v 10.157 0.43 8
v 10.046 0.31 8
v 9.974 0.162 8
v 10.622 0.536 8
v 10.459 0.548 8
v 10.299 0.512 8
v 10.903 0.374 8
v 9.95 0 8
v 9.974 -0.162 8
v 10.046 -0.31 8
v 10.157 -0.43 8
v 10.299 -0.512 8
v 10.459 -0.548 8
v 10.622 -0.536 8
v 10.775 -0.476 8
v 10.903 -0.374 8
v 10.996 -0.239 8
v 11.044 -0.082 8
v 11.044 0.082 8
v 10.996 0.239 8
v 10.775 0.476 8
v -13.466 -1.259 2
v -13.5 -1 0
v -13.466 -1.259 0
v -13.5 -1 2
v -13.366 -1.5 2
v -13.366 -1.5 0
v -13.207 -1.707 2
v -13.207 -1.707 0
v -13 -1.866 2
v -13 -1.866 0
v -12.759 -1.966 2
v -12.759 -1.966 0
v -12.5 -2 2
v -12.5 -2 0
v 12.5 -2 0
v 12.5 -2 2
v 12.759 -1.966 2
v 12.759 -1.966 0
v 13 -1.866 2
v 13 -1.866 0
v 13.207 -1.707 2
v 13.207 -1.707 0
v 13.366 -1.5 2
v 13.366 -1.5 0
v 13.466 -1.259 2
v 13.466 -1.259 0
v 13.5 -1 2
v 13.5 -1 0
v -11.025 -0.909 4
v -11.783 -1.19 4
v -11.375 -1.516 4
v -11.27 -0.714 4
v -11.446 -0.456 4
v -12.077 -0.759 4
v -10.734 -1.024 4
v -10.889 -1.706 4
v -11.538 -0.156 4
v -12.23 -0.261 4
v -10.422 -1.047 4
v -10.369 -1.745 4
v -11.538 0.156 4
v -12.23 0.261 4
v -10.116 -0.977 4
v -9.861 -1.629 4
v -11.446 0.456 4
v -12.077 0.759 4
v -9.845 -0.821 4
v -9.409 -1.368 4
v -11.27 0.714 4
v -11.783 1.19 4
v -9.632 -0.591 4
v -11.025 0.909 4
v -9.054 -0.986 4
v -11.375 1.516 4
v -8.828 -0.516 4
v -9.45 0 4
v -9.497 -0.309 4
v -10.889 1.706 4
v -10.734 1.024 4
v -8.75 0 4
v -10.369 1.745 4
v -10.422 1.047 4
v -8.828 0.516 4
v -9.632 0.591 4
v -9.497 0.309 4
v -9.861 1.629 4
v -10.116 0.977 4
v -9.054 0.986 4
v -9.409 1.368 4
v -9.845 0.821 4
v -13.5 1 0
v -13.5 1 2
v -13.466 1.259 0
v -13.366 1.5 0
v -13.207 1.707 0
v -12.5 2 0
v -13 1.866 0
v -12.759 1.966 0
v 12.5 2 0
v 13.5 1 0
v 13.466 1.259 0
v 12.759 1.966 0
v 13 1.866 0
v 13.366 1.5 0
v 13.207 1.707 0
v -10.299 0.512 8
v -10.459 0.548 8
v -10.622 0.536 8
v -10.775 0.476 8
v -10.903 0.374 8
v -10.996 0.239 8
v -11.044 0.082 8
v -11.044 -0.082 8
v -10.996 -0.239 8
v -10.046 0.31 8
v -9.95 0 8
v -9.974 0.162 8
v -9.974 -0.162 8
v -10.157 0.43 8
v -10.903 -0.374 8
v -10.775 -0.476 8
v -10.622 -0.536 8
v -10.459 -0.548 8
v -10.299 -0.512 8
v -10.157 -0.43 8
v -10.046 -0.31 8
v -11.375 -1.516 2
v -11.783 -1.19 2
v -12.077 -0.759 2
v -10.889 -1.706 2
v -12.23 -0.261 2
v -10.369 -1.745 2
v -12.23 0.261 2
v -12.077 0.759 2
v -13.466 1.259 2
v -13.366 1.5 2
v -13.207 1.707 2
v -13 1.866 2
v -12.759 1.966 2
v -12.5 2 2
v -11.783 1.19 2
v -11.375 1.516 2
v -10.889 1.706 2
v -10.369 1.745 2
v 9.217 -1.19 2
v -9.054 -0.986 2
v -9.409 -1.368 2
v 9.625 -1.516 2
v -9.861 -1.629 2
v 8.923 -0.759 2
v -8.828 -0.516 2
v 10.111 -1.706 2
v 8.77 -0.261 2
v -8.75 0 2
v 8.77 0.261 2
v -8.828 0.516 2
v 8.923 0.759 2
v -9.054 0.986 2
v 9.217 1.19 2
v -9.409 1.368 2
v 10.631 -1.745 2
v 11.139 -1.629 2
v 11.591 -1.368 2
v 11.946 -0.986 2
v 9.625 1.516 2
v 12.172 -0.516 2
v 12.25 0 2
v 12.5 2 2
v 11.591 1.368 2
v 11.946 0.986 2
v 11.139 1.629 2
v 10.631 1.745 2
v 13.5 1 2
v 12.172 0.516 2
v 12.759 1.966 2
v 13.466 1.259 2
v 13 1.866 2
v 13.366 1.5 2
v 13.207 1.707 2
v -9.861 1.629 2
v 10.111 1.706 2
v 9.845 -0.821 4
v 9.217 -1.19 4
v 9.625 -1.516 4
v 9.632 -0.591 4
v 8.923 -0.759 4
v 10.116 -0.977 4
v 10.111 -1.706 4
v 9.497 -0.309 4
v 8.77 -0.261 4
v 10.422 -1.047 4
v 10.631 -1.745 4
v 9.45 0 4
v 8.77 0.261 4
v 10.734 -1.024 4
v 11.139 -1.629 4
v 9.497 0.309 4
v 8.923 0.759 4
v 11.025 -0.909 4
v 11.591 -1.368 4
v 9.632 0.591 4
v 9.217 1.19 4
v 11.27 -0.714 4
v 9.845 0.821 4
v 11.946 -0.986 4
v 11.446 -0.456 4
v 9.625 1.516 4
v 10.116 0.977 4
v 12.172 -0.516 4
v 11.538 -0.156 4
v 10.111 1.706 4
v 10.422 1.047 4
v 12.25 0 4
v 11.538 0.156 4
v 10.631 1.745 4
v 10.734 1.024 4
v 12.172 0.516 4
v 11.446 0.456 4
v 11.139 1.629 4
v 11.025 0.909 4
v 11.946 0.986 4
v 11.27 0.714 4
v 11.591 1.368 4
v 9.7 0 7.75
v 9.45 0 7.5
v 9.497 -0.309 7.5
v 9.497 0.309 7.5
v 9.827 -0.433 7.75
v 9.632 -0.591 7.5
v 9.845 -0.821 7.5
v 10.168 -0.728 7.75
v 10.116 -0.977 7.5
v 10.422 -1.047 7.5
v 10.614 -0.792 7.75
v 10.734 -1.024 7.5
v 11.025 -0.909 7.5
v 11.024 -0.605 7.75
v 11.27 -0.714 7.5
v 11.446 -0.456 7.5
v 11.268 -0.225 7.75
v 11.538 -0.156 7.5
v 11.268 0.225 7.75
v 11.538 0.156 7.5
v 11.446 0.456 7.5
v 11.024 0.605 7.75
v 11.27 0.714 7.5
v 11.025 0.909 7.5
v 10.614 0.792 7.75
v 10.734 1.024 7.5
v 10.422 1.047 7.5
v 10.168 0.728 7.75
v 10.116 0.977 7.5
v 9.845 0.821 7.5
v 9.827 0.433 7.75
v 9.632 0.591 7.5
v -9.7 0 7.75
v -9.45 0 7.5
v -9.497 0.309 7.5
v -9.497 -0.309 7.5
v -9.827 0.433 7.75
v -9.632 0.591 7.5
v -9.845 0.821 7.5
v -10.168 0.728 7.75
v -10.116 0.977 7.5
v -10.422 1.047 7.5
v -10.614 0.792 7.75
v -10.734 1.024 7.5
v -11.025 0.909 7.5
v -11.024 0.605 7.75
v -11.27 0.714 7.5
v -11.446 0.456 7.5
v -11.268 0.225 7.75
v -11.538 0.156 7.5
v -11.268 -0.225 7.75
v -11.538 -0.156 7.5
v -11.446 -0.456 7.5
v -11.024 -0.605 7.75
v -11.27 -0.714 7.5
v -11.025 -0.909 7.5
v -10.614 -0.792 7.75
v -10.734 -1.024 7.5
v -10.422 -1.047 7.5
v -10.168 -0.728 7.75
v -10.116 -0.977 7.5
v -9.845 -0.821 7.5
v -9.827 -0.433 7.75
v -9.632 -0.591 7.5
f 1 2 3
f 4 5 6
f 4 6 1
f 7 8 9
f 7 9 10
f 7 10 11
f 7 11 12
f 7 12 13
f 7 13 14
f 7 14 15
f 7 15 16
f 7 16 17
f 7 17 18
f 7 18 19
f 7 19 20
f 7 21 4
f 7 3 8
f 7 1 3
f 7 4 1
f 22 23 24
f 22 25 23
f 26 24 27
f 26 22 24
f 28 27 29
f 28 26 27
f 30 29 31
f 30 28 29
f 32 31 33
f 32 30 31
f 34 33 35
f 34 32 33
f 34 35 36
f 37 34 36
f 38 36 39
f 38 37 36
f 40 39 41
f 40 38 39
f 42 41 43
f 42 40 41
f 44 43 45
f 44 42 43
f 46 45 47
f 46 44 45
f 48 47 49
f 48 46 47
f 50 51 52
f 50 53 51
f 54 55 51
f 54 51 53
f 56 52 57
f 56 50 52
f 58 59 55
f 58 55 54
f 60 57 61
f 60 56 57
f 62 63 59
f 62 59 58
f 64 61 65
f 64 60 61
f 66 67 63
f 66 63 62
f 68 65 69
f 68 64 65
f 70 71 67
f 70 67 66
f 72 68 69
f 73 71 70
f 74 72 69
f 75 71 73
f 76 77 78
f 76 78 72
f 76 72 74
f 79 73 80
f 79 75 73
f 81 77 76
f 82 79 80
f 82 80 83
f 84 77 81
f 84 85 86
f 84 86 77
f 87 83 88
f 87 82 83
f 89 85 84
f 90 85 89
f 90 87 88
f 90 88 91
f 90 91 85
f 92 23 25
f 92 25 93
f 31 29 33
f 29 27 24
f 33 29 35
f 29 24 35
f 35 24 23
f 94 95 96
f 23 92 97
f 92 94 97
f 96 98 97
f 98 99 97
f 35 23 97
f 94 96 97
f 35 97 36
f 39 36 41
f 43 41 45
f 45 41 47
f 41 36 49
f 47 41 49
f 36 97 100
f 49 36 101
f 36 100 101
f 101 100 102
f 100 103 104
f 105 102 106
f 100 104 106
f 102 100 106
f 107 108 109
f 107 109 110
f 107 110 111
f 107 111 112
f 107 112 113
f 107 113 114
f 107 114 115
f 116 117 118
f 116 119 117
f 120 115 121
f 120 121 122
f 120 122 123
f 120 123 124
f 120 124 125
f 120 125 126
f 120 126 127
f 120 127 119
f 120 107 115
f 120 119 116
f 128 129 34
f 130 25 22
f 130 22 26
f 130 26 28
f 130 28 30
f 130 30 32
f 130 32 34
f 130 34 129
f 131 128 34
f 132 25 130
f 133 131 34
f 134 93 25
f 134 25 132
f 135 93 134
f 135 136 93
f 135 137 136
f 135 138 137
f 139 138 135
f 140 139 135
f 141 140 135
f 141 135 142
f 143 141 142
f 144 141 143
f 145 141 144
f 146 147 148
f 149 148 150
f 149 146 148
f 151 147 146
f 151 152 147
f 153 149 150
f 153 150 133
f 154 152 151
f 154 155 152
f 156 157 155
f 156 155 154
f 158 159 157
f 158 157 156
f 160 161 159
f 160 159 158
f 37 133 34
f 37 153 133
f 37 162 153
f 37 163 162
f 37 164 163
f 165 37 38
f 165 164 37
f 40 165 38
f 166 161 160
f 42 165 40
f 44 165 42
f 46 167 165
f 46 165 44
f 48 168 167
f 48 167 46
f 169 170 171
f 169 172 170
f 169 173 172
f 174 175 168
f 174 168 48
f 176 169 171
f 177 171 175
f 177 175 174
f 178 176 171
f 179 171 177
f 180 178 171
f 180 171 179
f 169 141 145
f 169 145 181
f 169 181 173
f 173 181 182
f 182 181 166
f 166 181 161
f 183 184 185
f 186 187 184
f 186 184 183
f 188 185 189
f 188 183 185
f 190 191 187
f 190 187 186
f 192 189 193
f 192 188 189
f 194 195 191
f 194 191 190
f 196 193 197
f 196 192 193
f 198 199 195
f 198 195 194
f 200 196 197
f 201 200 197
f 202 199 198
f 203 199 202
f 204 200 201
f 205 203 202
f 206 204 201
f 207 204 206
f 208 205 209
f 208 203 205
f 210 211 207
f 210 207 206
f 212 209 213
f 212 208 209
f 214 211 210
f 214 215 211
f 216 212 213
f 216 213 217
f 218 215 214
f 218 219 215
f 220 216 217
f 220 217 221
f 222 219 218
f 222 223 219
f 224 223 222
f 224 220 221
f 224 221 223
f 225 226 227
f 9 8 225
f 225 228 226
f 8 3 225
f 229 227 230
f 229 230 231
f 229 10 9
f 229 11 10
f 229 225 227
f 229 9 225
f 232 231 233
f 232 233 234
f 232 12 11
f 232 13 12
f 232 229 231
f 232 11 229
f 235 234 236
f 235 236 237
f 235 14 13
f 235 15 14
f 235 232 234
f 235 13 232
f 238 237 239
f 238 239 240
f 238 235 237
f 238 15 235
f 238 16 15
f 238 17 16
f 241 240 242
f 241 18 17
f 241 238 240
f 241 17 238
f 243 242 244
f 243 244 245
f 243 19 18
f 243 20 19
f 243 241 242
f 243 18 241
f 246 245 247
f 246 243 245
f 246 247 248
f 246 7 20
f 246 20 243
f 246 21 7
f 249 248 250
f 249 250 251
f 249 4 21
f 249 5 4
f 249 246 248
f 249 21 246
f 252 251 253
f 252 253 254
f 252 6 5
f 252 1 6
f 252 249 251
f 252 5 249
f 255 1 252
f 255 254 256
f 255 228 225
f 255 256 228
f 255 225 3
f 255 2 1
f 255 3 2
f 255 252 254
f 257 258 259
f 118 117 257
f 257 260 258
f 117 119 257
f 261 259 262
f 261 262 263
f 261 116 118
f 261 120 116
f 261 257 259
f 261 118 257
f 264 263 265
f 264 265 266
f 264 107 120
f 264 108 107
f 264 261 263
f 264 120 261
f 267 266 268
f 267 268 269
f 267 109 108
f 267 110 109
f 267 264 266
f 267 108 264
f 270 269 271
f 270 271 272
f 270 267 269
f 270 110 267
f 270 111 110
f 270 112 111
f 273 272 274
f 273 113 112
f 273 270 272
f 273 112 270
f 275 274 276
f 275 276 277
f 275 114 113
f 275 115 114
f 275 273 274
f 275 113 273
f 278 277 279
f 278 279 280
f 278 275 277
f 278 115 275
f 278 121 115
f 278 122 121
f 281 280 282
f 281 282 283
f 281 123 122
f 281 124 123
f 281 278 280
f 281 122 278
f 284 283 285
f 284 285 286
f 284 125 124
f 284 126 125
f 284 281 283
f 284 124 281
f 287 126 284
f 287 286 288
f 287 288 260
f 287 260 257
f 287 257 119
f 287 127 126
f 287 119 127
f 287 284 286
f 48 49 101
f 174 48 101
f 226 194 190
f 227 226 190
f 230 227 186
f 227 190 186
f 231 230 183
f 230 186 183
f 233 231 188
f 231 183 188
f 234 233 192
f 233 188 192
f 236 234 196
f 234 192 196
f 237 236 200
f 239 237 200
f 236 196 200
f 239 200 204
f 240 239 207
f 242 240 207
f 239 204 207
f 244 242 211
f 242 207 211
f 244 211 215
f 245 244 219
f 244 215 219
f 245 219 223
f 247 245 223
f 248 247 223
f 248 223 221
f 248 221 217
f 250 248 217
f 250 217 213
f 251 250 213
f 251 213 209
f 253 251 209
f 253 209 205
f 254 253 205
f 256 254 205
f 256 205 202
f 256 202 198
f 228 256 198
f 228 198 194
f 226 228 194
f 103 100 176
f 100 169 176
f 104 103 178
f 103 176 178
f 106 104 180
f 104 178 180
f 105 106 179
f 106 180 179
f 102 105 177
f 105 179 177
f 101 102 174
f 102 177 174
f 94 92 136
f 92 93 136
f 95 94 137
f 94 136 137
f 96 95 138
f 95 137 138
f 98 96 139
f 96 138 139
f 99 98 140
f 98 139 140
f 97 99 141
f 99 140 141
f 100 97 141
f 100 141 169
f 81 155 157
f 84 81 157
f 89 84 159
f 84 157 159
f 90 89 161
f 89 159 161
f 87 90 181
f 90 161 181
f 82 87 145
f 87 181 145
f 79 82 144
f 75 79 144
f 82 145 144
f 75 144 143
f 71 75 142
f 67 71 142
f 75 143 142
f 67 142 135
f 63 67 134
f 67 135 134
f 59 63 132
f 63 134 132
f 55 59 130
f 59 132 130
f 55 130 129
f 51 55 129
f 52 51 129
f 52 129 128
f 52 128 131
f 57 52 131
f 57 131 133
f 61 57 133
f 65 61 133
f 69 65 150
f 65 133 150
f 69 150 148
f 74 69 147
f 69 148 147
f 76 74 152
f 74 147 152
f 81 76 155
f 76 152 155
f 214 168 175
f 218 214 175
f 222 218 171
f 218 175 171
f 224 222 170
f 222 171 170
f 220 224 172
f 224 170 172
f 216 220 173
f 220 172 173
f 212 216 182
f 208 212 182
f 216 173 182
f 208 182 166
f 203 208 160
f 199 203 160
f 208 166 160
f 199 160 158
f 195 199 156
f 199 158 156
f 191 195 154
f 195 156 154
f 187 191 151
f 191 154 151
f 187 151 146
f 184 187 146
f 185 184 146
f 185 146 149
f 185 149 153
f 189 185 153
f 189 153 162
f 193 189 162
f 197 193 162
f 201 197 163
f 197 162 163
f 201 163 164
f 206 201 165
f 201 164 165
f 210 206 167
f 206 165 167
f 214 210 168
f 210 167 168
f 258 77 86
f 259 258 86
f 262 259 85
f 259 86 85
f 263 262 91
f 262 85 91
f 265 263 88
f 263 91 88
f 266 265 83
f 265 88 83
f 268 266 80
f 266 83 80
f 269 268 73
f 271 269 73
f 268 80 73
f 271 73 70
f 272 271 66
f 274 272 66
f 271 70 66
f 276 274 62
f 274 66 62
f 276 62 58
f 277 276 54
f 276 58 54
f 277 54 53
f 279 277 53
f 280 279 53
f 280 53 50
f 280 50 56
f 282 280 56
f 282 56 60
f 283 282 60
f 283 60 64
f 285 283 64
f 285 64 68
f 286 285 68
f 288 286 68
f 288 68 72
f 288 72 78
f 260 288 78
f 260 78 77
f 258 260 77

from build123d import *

# Parameters (mm, degrees)
F0_W     = 27
F0_H     = 4
F1_DEPTH = 2
F2_R     = 1.05
F3_DEPTH = 6
F4_SIZE  = 0.5
F5_R     = 1
F6_R     = 1.75
F7_DEPTH = 2


with BuildPart() as f1:
    # F0 (on Top) → F1 (new body)
    with BuildSketch(Plane.XY):
        Rectangle(F0_W, F0_H)
    extrude(amount=F1_DEPTH)

    # F2 (on face) → F3 (join)
    with BuildSketch(Plane.XY.offset(2)):
        with Locations((-10.5, 0)):
            Circle(F2_R)
        with BuildLine():
            ThreePointArc((11.55, 0), (10.5, 1.05), (9.45, 0))
            ThreePointArc((9.45, 0), (10.5, -1.05), (11.55, 0))
        make_face()
    extrude(amount=F3_DEPTH)

    # F4
    f4_edges = [f1.edges().sort_by_distance(p)[0] for p in [
        (-11.55, 0, 8),
        (11.55, 0, 8),
    ]]
    chamfer(f4_edges, length=F4_SIZE)

    # F5
    f5_edges = [f1.edges().sort_by_distance(p)[0] for p in [
        (-13.5, -2, 1),
        (-13.5, 2, 1),
        (13.5, 2, 1),
        (13.5, -2, 1),
    ]]
    fillet(f5_edges, radius=F5_R)

    # F6 (on face) → F7 (join)
    with BuildSketch(Plane.XY.offset(2)):
        with Locations((-10.5, 0)):
            Circle(F6_R)
        with Locations((10.5, 0)):
            Circle(F6_R)
    extrude(amount=F7_DEPTH)


solid = f1.part
